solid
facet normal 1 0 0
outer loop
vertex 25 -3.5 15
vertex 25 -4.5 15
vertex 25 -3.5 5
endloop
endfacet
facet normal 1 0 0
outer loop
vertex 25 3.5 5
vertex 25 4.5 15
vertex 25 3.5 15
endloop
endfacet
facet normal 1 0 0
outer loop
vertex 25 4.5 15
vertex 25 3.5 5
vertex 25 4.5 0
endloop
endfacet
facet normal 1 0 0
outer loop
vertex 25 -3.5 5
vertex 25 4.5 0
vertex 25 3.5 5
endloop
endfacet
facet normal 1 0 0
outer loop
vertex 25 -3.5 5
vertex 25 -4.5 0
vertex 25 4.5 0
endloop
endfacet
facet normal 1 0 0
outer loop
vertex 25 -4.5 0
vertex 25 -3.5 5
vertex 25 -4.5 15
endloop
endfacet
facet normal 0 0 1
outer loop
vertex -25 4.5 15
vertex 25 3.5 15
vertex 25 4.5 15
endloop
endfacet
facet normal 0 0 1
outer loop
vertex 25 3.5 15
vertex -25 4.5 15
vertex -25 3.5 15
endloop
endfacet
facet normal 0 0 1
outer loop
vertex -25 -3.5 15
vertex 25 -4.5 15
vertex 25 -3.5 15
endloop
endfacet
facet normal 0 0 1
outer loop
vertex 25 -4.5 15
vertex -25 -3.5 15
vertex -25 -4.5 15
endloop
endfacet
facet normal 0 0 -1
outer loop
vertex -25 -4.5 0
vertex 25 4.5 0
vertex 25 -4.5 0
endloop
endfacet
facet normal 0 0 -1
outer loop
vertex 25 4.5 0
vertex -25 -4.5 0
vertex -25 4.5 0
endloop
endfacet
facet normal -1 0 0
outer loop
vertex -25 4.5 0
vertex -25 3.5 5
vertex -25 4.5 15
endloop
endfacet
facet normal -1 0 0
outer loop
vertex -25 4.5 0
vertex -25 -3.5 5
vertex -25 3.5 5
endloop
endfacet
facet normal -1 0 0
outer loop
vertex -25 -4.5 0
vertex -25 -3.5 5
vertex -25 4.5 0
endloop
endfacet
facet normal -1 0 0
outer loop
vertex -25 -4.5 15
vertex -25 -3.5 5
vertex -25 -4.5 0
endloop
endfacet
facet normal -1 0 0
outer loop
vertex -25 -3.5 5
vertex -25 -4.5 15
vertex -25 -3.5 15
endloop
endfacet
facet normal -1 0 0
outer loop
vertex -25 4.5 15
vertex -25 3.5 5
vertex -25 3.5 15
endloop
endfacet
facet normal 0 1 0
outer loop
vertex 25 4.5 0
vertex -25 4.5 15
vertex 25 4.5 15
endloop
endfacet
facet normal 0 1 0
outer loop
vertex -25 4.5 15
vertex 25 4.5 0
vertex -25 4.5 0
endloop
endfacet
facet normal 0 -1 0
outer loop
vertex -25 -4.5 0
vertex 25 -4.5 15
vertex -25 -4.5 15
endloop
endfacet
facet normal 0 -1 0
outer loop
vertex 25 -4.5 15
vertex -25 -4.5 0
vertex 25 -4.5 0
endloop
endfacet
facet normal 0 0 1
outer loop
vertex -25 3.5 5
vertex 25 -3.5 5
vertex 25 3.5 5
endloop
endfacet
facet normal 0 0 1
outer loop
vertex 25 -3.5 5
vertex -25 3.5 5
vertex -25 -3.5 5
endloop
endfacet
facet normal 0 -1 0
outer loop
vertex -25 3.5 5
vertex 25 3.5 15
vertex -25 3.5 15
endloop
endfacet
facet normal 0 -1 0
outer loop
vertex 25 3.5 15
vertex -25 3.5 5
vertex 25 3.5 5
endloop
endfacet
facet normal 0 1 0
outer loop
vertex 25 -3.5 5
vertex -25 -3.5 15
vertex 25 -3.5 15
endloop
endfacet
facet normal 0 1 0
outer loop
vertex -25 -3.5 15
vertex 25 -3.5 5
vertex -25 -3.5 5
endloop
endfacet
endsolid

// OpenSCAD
// Customizable Replicator Bed Adjustment Clip

// How long a clip do you need, in mm? (50 fits Replicator)
len = 50*1;
// How much do you want the clip to lower the Replicator print bed?
height=5;
// How thick should the clip "wings" be?
t=1*1;
// How much should the "wings" stick up?
tail=10*1;
// How thick is the board it clips around, plus a little clearance?
around=7*1;	

width=around+2*t;

translate([-len/2,-width/2,0]) 
difference() {
	cube([len,width,height+tail]);
	translate([-1,t,height]) cube([len+2,around,tail+1]);
	}
